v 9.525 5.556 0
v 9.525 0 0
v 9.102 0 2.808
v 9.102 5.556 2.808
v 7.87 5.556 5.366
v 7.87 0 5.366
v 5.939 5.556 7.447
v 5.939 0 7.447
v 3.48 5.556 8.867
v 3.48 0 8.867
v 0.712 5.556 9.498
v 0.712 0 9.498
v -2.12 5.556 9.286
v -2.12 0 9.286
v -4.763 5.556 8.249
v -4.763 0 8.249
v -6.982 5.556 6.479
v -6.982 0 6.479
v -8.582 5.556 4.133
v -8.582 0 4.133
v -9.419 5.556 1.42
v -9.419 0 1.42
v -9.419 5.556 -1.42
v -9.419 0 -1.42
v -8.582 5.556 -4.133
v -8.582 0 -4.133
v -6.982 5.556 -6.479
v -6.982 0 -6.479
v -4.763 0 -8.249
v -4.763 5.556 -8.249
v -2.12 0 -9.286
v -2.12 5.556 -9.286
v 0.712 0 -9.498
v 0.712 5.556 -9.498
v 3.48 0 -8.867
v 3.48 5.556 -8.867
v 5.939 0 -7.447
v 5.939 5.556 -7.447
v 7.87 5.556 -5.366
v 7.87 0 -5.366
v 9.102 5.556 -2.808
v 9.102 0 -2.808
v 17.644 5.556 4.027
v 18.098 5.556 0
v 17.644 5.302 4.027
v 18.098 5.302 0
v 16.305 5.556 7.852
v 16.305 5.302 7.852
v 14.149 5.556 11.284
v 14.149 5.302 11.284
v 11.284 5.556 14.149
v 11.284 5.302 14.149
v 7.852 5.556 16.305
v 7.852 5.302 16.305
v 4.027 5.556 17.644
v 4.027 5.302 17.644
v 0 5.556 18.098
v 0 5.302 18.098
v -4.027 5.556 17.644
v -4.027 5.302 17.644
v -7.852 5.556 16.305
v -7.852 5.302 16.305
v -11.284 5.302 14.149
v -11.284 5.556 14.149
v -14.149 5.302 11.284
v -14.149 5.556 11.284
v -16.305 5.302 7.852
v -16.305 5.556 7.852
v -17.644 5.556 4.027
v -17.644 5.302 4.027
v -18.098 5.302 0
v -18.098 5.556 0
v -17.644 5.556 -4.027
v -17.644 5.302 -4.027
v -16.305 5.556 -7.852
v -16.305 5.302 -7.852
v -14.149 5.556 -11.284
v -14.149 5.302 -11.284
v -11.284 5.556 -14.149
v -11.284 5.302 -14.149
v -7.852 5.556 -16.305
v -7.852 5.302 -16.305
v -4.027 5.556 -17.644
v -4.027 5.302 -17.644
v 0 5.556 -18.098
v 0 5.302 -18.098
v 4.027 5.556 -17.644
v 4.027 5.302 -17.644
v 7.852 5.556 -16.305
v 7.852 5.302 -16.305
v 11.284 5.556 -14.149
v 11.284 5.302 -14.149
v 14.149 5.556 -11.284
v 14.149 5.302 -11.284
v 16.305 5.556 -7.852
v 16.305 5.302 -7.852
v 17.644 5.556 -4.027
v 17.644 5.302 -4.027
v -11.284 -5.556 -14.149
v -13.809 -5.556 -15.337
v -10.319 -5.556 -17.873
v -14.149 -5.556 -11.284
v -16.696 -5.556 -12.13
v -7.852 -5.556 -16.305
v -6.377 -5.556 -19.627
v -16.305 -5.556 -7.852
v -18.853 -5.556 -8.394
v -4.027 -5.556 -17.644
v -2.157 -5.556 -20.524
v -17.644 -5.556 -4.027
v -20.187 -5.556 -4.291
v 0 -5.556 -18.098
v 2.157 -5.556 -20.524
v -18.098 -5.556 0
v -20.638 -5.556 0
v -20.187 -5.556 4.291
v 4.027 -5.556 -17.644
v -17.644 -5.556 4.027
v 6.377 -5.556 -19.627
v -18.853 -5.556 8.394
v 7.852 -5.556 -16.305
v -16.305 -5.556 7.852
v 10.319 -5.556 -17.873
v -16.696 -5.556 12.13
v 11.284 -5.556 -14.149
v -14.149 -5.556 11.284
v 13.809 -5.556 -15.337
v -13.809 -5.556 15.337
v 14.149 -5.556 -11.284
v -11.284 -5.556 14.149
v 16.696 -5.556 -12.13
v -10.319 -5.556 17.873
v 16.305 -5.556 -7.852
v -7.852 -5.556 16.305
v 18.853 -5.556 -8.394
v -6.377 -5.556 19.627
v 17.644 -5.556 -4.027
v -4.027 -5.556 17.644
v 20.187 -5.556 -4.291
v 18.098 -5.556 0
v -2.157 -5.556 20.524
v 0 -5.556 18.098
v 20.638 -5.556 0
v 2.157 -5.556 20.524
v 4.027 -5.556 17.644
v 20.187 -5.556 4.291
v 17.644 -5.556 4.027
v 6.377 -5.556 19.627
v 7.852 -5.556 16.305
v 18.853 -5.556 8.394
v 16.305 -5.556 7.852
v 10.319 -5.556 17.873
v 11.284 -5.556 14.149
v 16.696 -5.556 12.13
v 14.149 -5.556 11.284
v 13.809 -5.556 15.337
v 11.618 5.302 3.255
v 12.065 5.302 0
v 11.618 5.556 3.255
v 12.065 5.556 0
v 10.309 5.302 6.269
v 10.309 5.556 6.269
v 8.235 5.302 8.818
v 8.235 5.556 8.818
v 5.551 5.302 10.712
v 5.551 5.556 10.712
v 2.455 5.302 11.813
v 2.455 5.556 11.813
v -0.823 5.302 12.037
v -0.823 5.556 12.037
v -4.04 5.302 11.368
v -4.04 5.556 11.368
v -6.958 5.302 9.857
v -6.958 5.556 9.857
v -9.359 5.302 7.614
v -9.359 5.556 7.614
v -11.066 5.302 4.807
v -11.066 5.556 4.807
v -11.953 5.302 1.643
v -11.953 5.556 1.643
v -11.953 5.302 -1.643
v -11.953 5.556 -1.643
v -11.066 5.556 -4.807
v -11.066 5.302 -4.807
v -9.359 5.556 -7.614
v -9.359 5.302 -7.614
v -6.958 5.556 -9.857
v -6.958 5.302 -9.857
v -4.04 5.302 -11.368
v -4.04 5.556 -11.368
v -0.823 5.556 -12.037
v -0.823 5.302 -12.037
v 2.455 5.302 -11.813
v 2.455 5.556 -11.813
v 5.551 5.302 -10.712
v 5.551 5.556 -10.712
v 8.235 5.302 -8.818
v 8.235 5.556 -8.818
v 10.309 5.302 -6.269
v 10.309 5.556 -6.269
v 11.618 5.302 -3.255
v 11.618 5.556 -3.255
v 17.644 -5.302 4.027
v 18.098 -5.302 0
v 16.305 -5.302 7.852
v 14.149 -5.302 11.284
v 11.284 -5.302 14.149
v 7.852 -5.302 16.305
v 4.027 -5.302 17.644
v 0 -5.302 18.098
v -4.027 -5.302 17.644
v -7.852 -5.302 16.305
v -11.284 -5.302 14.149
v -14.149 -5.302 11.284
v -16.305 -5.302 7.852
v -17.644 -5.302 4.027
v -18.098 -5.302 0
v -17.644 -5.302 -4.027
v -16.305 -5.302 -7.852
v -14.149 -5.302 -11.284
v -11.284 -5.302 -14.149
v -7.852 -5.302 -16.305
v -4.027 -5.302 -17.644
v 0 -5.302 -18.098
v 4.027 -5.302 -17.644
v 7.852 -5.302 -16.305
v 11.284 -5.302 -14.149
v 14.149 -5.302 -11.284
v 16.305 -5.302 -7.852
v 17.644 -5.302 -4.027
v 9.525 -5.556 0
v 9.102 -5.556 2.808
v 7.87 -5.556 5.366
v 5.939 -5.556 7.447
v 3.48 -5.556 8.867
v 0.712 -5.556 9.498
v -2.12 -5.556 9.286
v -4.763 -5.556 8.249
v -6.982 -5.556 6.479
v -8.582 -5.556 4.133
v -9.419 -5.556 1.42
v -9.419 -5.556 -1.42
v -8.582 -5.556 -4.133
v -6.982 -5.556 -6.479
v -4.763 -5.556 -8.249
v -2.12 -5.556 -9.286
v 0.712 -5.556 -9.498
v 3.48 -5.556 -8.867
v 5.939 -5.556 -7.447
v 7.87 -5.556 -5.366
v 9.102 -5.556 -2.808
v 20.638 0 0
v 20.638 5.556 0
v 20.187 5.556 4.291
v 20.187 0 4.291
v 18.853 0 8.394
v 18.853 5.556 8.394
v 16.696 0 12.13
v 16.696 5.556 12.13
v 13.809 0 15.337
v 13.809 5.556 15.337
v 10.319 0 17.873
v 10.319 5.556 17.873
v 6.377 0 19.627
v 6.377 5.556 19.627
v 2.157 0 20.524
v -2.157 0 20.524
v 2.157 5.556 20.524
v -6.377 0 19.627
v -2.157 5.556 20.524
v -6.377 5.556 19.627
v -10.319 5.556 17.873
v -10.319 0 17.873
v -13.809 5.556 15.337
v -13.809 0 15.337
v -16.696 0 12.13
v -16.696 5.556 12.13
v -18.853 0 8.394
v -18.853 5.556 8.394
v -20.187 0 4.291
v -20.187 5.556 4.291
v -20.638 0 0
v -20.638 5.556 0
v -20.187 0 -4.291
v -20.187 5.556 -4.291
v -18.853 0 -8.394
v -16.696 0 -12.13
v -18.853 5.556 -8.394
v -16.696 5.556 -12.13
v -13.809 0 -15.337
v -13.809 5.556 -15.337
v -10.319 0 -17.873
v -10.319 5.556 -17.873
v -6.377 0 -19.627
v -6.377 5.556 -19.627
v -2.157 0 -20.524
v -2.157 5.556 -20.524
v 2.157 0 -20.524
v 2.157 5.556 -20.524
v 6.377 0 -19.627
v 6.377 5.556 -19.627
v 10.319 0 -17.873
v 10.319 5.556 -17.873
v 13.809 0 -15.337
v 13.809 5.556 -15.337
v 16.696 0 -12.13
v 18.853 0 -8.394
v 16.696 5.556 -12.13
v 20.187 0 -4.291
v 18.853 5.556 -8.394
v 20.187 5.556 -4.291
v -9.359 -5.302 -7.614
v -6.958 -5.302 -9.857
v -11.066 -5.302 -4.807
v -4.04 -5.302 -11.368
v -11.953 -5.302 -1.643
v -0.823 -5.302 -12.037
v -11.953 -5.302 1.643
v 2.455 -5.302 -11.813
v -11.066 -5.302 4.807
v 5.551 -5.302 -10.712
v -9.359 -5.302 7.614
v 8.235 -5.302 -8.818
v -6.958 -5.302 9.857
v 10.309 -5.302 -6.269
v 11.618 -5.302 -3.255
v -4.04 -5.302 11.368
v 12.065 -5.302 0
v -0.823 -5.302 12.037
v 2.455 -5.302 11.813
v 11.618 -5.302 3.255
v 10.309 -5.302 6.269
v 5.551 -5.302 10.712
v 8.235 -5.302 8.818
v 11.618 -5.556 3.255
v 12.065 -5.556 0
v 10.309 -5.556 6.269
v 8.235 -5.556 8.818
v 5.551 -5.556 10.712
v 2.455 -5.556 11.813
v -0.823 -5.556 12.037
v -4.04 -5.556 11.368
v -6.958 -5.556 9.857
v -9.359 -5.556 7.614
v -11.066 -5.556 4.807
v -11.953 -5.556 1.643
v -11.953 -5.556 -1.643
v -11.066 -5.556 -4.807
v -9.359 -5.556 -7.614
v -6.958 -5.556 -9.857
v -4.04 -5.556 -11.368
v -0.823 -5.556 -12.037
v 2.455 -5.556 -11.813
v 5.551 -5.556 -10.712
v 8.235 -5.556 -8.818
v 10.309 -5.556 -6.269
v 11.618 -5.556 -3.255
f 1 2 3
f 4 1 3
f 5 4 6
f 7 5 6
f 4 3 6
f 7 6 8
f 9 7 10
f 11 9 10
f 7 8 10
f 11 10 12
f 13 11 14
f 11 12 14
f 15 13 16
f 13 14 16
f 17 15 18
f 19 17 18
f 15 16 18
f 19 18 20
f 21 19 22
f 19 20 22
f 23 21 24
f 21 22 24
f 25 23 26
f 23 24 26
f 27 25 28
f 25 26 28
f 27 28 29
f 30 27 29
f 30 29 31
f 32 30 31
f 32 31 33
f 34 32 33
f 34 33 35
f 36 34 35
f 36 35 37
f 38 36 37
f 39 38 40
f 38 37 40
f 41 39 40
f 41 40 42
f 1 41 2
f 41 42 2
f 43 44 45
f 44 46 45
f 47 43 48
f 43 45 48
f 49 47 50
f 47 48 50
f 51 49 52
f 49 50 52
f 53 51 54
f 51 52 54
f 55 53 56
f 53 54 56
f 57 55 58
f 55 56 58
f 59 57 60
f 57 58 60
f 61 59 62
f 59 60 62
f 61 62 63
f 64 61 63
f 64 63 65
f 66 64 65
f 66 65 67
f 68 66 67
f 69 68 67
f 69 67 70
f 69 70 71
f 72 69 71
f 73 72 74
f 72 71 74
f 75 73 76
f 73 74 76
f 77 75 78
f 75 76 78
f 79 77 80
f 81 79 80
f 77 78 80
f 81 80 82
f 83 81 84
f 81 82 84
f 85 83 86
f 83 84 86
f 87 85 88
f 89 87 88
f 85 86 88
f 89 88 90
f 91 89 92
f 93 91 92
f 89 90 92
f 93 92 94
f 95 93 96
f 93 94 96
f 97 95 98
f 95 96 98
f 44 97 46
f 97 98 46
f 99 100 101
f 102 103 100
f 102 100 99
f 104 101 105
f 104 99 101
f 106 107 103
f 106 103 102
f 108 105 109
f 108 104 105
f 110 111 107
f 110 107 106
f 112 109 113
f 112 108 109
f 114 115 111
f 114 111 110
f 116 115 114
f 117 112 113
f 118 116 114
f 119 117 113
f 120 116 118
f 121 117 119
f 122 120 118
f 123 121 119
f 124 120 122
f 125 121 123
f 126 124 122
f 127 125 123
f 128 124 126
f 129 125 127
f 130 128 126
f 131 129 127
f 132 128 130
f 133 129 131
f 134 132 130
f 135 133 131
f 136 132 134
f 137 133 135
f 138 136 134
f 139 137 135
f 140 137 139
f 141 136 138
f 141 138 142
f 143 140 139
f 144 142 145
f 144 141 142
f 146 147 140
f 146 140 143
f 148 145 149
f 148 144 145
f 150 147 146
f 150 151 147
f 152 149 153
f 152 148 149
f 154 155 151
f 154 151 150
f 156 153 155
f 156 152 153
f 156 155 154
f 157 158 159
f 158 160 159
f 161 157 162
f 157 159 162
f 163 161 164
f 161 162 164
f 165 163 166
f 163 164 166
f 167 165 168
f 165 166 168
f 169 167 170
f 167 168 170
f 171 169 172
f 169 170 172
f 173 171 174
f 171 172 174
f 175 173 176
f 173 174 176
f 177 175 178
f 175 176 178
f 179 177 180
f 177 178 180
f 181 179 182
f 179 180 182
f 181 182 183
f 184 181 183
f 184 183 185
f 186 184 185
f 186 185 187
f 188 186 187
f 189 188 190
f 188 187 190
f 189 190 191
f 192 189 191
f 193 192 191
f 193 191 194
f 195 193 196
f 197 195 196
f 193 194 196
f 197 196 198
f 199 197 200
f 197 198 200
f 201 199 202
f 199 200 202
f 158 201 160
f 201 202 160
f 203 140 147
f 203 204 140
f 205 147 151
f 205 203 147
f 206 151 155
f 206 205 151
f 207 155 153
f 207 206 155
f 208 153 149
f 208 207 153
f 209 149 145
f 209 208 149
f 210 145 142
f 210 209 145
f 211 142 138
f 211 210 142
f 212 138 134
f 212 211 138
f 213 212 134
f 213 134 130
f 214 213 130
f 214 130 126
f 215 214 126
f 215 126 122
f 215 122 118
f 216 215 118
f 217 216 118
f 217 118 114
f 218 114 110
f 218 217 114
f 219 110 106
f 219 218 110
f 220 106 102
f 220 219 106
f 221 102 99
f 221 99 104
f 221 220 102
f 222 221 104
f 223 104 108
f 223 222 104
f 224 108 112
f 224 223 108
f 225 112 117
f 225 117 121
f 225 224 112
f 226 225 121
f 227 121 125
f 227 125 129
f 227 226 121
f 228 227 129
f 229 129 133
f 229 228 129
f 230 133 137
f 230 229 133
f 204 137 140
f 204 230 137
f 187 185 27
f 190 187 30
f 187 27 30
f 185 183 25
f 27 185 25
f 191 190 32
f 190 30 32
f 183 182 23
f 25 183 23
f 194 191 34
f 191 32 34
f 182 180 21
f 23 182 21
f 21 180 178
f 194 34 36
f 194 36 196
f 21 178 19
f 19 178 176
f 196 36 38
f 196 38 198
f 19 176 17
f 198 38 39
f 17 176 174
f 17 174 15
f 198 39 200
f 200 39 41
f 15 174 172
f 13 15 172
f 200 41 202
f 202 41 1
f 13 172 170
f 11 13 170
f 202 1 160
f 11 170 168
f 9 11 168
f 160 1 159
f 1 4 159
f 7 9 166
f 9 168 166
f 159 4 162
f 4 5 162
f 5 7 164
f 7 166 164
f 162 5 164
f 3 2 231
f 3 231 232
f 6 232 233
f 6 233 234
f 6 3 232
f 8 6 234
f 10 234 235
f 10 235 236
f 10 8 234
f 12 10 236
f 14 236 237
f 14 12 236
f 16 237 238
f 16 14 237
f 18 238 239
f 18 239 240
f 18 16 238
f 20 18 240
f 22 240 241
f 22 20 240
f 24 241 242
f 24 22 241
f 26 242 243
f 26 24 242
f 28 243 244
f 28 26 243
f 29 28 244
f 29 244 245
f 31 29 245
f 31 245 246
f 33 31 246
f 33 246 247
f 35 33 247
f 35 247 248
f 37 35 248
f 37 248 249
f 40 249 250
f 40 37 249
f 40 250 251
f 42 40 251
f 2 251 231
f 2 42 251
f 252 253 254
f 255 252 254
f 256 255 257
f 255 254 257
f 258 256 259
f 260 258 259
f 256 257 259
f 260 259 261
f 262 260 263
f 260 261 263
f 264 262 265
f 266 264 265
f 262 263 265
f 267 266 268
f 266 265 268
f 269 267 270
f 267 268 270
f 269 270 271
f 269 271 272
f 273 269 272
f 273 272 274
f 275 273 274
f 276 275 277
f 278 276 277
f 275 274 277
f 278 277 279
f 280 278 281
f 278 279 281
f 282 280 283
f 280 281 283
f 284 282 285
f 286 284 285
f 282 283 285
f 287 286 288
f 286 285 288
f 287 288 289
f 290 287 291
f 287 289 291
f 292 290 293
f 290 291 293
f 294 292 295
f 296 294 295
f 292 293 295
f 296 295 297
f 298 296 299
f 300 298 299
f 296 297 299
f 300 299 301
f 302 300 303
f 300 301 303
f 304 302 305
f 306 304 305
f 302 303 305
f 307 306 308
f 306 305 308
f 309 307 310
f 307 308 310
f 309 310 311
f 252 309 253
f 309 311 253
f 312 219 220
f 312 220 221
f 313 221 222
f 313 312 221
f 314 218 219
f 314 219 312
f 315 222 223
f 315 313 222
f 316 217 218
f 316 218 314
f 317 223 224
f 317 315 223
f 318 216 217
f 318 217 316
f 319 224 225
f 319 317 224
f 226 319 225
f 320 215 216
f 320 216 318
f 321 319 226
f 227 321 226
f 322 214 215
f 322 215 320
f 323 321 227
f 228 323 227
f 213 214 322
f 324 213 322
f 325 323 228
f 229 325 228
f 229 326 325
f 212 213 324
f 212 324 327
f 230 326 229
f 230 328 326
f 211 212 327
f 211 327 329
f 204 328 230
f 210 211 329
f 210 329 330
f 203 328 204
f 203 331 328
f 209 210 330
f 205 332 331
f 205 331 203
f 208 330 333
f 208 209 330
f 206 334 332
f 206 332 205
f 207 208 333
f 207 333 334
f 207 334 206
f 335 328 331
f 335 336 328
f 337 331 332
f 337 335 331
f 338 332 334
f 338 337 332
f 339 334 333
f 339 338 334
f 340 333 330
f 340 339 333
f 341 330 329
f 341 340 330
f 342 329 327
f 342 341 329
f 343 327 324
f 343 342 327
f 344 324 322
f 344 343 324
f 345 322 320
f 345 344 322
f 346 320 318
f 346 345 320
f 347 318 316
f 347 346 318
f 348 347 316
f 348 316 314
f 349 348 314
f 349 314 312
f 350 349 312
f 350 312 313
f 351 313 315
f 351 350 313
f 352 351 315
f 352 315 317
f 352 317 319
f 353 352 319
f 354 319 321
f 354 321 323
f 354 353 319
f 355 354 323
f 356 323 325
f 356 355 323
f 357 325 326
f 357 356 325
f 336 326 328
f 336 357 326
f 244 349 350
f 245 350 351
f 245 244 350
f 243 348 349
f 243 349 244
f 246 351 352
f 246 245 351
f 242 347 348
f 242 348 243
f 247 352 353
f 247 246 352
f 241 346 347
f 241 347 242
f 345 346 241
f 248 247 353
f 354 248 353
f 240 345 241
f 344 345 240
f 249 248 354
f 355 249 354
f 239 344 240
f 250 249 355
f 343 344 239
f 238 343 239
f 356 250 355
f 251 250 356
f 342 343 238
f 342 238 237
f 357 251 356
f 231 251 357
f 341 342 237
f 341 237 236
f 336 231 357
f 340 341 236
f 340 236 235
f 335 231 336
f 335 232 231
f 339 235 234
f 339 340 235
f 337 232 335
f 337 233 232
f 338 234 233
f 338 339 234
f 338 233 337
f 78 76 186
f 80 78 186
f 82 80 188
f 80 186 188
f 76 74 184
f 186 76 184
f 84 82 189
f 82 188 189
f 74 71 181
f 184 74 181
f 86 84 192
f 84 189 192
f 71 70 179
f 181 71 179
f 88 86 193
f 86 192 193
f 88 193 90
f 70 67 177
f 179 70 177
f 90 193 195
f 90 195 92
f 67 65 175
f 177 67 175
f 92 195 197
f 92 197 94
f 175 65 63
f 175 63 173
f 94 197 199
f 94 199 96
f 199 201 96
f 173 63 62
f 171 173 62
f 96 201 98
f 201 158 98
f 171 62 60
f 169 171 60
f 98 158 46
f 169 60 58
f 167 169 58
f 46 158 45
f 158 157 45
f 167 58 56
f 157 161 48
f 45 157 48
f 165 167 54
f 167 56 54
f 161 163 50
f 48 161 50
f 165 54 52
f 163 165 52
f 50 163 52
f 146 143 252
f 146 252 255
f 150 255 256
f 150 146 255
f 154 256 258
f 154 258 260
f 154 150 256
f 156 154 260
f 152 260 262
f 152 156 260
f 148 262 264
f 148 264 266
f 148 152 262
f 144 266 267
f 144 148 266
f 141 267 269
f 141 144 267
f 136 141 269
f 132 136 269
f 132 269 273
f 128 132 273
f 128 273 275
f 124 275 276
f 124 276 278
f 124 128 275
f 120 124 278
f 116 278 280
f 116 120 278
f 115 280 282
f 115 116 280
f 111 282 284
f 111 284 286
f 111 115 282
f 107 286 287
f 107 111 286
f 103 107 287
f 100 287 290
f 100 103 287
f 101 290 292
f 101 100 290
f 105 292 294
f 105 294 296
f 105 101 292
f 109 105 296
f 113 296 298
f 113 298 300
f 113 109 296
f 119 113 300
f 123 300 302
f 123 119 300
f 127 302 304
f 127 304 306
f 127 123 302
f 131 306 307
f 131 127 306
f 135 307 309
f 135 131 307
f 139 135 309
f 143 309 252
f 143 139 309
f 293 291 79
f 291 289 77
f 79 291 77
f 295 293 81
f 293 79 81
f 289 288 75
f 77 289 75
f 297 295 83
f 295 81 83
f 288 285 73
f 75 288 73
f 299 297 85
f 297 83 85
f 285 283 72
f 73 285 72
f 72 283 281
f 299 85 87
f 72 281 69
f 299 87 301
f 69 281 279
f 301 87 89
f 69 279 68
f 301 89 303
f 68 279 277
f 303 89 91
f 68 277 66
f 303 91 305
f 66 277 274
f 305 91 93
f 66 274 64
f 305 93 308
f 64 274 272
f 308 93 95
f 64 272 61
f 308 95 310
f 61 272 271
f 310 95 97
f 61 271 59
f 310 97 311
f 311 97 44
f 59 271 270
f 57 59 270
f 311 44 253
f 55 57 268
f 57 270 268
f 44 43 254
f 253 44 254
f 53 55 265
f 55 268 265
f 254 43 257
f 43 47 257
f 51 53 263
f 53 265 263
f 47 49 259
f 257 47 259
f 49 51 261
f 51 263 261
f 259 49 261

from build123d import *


with BuildPart() as part:
    # Sketch1 → Revolve1 (revolve)
    with BuildSketch(Plane.XY):
        Polygon((9.525, 0), (20.6375, 0), (20.6375, 5.55625), (18.0975, 5.55625), (18.0975, 5.30225), (12.065, 5.30225), (12.065, 5.55625), (9.525, 5.55625), align=None)
    revolve1 = revolve(axis=Axis((0, 28.620588043, 0), (0, -1, 0)))

    # Mirror1: Revolve1 across plane
    add(revolve1.mirror(Plane.ZX))


solid = part.part
